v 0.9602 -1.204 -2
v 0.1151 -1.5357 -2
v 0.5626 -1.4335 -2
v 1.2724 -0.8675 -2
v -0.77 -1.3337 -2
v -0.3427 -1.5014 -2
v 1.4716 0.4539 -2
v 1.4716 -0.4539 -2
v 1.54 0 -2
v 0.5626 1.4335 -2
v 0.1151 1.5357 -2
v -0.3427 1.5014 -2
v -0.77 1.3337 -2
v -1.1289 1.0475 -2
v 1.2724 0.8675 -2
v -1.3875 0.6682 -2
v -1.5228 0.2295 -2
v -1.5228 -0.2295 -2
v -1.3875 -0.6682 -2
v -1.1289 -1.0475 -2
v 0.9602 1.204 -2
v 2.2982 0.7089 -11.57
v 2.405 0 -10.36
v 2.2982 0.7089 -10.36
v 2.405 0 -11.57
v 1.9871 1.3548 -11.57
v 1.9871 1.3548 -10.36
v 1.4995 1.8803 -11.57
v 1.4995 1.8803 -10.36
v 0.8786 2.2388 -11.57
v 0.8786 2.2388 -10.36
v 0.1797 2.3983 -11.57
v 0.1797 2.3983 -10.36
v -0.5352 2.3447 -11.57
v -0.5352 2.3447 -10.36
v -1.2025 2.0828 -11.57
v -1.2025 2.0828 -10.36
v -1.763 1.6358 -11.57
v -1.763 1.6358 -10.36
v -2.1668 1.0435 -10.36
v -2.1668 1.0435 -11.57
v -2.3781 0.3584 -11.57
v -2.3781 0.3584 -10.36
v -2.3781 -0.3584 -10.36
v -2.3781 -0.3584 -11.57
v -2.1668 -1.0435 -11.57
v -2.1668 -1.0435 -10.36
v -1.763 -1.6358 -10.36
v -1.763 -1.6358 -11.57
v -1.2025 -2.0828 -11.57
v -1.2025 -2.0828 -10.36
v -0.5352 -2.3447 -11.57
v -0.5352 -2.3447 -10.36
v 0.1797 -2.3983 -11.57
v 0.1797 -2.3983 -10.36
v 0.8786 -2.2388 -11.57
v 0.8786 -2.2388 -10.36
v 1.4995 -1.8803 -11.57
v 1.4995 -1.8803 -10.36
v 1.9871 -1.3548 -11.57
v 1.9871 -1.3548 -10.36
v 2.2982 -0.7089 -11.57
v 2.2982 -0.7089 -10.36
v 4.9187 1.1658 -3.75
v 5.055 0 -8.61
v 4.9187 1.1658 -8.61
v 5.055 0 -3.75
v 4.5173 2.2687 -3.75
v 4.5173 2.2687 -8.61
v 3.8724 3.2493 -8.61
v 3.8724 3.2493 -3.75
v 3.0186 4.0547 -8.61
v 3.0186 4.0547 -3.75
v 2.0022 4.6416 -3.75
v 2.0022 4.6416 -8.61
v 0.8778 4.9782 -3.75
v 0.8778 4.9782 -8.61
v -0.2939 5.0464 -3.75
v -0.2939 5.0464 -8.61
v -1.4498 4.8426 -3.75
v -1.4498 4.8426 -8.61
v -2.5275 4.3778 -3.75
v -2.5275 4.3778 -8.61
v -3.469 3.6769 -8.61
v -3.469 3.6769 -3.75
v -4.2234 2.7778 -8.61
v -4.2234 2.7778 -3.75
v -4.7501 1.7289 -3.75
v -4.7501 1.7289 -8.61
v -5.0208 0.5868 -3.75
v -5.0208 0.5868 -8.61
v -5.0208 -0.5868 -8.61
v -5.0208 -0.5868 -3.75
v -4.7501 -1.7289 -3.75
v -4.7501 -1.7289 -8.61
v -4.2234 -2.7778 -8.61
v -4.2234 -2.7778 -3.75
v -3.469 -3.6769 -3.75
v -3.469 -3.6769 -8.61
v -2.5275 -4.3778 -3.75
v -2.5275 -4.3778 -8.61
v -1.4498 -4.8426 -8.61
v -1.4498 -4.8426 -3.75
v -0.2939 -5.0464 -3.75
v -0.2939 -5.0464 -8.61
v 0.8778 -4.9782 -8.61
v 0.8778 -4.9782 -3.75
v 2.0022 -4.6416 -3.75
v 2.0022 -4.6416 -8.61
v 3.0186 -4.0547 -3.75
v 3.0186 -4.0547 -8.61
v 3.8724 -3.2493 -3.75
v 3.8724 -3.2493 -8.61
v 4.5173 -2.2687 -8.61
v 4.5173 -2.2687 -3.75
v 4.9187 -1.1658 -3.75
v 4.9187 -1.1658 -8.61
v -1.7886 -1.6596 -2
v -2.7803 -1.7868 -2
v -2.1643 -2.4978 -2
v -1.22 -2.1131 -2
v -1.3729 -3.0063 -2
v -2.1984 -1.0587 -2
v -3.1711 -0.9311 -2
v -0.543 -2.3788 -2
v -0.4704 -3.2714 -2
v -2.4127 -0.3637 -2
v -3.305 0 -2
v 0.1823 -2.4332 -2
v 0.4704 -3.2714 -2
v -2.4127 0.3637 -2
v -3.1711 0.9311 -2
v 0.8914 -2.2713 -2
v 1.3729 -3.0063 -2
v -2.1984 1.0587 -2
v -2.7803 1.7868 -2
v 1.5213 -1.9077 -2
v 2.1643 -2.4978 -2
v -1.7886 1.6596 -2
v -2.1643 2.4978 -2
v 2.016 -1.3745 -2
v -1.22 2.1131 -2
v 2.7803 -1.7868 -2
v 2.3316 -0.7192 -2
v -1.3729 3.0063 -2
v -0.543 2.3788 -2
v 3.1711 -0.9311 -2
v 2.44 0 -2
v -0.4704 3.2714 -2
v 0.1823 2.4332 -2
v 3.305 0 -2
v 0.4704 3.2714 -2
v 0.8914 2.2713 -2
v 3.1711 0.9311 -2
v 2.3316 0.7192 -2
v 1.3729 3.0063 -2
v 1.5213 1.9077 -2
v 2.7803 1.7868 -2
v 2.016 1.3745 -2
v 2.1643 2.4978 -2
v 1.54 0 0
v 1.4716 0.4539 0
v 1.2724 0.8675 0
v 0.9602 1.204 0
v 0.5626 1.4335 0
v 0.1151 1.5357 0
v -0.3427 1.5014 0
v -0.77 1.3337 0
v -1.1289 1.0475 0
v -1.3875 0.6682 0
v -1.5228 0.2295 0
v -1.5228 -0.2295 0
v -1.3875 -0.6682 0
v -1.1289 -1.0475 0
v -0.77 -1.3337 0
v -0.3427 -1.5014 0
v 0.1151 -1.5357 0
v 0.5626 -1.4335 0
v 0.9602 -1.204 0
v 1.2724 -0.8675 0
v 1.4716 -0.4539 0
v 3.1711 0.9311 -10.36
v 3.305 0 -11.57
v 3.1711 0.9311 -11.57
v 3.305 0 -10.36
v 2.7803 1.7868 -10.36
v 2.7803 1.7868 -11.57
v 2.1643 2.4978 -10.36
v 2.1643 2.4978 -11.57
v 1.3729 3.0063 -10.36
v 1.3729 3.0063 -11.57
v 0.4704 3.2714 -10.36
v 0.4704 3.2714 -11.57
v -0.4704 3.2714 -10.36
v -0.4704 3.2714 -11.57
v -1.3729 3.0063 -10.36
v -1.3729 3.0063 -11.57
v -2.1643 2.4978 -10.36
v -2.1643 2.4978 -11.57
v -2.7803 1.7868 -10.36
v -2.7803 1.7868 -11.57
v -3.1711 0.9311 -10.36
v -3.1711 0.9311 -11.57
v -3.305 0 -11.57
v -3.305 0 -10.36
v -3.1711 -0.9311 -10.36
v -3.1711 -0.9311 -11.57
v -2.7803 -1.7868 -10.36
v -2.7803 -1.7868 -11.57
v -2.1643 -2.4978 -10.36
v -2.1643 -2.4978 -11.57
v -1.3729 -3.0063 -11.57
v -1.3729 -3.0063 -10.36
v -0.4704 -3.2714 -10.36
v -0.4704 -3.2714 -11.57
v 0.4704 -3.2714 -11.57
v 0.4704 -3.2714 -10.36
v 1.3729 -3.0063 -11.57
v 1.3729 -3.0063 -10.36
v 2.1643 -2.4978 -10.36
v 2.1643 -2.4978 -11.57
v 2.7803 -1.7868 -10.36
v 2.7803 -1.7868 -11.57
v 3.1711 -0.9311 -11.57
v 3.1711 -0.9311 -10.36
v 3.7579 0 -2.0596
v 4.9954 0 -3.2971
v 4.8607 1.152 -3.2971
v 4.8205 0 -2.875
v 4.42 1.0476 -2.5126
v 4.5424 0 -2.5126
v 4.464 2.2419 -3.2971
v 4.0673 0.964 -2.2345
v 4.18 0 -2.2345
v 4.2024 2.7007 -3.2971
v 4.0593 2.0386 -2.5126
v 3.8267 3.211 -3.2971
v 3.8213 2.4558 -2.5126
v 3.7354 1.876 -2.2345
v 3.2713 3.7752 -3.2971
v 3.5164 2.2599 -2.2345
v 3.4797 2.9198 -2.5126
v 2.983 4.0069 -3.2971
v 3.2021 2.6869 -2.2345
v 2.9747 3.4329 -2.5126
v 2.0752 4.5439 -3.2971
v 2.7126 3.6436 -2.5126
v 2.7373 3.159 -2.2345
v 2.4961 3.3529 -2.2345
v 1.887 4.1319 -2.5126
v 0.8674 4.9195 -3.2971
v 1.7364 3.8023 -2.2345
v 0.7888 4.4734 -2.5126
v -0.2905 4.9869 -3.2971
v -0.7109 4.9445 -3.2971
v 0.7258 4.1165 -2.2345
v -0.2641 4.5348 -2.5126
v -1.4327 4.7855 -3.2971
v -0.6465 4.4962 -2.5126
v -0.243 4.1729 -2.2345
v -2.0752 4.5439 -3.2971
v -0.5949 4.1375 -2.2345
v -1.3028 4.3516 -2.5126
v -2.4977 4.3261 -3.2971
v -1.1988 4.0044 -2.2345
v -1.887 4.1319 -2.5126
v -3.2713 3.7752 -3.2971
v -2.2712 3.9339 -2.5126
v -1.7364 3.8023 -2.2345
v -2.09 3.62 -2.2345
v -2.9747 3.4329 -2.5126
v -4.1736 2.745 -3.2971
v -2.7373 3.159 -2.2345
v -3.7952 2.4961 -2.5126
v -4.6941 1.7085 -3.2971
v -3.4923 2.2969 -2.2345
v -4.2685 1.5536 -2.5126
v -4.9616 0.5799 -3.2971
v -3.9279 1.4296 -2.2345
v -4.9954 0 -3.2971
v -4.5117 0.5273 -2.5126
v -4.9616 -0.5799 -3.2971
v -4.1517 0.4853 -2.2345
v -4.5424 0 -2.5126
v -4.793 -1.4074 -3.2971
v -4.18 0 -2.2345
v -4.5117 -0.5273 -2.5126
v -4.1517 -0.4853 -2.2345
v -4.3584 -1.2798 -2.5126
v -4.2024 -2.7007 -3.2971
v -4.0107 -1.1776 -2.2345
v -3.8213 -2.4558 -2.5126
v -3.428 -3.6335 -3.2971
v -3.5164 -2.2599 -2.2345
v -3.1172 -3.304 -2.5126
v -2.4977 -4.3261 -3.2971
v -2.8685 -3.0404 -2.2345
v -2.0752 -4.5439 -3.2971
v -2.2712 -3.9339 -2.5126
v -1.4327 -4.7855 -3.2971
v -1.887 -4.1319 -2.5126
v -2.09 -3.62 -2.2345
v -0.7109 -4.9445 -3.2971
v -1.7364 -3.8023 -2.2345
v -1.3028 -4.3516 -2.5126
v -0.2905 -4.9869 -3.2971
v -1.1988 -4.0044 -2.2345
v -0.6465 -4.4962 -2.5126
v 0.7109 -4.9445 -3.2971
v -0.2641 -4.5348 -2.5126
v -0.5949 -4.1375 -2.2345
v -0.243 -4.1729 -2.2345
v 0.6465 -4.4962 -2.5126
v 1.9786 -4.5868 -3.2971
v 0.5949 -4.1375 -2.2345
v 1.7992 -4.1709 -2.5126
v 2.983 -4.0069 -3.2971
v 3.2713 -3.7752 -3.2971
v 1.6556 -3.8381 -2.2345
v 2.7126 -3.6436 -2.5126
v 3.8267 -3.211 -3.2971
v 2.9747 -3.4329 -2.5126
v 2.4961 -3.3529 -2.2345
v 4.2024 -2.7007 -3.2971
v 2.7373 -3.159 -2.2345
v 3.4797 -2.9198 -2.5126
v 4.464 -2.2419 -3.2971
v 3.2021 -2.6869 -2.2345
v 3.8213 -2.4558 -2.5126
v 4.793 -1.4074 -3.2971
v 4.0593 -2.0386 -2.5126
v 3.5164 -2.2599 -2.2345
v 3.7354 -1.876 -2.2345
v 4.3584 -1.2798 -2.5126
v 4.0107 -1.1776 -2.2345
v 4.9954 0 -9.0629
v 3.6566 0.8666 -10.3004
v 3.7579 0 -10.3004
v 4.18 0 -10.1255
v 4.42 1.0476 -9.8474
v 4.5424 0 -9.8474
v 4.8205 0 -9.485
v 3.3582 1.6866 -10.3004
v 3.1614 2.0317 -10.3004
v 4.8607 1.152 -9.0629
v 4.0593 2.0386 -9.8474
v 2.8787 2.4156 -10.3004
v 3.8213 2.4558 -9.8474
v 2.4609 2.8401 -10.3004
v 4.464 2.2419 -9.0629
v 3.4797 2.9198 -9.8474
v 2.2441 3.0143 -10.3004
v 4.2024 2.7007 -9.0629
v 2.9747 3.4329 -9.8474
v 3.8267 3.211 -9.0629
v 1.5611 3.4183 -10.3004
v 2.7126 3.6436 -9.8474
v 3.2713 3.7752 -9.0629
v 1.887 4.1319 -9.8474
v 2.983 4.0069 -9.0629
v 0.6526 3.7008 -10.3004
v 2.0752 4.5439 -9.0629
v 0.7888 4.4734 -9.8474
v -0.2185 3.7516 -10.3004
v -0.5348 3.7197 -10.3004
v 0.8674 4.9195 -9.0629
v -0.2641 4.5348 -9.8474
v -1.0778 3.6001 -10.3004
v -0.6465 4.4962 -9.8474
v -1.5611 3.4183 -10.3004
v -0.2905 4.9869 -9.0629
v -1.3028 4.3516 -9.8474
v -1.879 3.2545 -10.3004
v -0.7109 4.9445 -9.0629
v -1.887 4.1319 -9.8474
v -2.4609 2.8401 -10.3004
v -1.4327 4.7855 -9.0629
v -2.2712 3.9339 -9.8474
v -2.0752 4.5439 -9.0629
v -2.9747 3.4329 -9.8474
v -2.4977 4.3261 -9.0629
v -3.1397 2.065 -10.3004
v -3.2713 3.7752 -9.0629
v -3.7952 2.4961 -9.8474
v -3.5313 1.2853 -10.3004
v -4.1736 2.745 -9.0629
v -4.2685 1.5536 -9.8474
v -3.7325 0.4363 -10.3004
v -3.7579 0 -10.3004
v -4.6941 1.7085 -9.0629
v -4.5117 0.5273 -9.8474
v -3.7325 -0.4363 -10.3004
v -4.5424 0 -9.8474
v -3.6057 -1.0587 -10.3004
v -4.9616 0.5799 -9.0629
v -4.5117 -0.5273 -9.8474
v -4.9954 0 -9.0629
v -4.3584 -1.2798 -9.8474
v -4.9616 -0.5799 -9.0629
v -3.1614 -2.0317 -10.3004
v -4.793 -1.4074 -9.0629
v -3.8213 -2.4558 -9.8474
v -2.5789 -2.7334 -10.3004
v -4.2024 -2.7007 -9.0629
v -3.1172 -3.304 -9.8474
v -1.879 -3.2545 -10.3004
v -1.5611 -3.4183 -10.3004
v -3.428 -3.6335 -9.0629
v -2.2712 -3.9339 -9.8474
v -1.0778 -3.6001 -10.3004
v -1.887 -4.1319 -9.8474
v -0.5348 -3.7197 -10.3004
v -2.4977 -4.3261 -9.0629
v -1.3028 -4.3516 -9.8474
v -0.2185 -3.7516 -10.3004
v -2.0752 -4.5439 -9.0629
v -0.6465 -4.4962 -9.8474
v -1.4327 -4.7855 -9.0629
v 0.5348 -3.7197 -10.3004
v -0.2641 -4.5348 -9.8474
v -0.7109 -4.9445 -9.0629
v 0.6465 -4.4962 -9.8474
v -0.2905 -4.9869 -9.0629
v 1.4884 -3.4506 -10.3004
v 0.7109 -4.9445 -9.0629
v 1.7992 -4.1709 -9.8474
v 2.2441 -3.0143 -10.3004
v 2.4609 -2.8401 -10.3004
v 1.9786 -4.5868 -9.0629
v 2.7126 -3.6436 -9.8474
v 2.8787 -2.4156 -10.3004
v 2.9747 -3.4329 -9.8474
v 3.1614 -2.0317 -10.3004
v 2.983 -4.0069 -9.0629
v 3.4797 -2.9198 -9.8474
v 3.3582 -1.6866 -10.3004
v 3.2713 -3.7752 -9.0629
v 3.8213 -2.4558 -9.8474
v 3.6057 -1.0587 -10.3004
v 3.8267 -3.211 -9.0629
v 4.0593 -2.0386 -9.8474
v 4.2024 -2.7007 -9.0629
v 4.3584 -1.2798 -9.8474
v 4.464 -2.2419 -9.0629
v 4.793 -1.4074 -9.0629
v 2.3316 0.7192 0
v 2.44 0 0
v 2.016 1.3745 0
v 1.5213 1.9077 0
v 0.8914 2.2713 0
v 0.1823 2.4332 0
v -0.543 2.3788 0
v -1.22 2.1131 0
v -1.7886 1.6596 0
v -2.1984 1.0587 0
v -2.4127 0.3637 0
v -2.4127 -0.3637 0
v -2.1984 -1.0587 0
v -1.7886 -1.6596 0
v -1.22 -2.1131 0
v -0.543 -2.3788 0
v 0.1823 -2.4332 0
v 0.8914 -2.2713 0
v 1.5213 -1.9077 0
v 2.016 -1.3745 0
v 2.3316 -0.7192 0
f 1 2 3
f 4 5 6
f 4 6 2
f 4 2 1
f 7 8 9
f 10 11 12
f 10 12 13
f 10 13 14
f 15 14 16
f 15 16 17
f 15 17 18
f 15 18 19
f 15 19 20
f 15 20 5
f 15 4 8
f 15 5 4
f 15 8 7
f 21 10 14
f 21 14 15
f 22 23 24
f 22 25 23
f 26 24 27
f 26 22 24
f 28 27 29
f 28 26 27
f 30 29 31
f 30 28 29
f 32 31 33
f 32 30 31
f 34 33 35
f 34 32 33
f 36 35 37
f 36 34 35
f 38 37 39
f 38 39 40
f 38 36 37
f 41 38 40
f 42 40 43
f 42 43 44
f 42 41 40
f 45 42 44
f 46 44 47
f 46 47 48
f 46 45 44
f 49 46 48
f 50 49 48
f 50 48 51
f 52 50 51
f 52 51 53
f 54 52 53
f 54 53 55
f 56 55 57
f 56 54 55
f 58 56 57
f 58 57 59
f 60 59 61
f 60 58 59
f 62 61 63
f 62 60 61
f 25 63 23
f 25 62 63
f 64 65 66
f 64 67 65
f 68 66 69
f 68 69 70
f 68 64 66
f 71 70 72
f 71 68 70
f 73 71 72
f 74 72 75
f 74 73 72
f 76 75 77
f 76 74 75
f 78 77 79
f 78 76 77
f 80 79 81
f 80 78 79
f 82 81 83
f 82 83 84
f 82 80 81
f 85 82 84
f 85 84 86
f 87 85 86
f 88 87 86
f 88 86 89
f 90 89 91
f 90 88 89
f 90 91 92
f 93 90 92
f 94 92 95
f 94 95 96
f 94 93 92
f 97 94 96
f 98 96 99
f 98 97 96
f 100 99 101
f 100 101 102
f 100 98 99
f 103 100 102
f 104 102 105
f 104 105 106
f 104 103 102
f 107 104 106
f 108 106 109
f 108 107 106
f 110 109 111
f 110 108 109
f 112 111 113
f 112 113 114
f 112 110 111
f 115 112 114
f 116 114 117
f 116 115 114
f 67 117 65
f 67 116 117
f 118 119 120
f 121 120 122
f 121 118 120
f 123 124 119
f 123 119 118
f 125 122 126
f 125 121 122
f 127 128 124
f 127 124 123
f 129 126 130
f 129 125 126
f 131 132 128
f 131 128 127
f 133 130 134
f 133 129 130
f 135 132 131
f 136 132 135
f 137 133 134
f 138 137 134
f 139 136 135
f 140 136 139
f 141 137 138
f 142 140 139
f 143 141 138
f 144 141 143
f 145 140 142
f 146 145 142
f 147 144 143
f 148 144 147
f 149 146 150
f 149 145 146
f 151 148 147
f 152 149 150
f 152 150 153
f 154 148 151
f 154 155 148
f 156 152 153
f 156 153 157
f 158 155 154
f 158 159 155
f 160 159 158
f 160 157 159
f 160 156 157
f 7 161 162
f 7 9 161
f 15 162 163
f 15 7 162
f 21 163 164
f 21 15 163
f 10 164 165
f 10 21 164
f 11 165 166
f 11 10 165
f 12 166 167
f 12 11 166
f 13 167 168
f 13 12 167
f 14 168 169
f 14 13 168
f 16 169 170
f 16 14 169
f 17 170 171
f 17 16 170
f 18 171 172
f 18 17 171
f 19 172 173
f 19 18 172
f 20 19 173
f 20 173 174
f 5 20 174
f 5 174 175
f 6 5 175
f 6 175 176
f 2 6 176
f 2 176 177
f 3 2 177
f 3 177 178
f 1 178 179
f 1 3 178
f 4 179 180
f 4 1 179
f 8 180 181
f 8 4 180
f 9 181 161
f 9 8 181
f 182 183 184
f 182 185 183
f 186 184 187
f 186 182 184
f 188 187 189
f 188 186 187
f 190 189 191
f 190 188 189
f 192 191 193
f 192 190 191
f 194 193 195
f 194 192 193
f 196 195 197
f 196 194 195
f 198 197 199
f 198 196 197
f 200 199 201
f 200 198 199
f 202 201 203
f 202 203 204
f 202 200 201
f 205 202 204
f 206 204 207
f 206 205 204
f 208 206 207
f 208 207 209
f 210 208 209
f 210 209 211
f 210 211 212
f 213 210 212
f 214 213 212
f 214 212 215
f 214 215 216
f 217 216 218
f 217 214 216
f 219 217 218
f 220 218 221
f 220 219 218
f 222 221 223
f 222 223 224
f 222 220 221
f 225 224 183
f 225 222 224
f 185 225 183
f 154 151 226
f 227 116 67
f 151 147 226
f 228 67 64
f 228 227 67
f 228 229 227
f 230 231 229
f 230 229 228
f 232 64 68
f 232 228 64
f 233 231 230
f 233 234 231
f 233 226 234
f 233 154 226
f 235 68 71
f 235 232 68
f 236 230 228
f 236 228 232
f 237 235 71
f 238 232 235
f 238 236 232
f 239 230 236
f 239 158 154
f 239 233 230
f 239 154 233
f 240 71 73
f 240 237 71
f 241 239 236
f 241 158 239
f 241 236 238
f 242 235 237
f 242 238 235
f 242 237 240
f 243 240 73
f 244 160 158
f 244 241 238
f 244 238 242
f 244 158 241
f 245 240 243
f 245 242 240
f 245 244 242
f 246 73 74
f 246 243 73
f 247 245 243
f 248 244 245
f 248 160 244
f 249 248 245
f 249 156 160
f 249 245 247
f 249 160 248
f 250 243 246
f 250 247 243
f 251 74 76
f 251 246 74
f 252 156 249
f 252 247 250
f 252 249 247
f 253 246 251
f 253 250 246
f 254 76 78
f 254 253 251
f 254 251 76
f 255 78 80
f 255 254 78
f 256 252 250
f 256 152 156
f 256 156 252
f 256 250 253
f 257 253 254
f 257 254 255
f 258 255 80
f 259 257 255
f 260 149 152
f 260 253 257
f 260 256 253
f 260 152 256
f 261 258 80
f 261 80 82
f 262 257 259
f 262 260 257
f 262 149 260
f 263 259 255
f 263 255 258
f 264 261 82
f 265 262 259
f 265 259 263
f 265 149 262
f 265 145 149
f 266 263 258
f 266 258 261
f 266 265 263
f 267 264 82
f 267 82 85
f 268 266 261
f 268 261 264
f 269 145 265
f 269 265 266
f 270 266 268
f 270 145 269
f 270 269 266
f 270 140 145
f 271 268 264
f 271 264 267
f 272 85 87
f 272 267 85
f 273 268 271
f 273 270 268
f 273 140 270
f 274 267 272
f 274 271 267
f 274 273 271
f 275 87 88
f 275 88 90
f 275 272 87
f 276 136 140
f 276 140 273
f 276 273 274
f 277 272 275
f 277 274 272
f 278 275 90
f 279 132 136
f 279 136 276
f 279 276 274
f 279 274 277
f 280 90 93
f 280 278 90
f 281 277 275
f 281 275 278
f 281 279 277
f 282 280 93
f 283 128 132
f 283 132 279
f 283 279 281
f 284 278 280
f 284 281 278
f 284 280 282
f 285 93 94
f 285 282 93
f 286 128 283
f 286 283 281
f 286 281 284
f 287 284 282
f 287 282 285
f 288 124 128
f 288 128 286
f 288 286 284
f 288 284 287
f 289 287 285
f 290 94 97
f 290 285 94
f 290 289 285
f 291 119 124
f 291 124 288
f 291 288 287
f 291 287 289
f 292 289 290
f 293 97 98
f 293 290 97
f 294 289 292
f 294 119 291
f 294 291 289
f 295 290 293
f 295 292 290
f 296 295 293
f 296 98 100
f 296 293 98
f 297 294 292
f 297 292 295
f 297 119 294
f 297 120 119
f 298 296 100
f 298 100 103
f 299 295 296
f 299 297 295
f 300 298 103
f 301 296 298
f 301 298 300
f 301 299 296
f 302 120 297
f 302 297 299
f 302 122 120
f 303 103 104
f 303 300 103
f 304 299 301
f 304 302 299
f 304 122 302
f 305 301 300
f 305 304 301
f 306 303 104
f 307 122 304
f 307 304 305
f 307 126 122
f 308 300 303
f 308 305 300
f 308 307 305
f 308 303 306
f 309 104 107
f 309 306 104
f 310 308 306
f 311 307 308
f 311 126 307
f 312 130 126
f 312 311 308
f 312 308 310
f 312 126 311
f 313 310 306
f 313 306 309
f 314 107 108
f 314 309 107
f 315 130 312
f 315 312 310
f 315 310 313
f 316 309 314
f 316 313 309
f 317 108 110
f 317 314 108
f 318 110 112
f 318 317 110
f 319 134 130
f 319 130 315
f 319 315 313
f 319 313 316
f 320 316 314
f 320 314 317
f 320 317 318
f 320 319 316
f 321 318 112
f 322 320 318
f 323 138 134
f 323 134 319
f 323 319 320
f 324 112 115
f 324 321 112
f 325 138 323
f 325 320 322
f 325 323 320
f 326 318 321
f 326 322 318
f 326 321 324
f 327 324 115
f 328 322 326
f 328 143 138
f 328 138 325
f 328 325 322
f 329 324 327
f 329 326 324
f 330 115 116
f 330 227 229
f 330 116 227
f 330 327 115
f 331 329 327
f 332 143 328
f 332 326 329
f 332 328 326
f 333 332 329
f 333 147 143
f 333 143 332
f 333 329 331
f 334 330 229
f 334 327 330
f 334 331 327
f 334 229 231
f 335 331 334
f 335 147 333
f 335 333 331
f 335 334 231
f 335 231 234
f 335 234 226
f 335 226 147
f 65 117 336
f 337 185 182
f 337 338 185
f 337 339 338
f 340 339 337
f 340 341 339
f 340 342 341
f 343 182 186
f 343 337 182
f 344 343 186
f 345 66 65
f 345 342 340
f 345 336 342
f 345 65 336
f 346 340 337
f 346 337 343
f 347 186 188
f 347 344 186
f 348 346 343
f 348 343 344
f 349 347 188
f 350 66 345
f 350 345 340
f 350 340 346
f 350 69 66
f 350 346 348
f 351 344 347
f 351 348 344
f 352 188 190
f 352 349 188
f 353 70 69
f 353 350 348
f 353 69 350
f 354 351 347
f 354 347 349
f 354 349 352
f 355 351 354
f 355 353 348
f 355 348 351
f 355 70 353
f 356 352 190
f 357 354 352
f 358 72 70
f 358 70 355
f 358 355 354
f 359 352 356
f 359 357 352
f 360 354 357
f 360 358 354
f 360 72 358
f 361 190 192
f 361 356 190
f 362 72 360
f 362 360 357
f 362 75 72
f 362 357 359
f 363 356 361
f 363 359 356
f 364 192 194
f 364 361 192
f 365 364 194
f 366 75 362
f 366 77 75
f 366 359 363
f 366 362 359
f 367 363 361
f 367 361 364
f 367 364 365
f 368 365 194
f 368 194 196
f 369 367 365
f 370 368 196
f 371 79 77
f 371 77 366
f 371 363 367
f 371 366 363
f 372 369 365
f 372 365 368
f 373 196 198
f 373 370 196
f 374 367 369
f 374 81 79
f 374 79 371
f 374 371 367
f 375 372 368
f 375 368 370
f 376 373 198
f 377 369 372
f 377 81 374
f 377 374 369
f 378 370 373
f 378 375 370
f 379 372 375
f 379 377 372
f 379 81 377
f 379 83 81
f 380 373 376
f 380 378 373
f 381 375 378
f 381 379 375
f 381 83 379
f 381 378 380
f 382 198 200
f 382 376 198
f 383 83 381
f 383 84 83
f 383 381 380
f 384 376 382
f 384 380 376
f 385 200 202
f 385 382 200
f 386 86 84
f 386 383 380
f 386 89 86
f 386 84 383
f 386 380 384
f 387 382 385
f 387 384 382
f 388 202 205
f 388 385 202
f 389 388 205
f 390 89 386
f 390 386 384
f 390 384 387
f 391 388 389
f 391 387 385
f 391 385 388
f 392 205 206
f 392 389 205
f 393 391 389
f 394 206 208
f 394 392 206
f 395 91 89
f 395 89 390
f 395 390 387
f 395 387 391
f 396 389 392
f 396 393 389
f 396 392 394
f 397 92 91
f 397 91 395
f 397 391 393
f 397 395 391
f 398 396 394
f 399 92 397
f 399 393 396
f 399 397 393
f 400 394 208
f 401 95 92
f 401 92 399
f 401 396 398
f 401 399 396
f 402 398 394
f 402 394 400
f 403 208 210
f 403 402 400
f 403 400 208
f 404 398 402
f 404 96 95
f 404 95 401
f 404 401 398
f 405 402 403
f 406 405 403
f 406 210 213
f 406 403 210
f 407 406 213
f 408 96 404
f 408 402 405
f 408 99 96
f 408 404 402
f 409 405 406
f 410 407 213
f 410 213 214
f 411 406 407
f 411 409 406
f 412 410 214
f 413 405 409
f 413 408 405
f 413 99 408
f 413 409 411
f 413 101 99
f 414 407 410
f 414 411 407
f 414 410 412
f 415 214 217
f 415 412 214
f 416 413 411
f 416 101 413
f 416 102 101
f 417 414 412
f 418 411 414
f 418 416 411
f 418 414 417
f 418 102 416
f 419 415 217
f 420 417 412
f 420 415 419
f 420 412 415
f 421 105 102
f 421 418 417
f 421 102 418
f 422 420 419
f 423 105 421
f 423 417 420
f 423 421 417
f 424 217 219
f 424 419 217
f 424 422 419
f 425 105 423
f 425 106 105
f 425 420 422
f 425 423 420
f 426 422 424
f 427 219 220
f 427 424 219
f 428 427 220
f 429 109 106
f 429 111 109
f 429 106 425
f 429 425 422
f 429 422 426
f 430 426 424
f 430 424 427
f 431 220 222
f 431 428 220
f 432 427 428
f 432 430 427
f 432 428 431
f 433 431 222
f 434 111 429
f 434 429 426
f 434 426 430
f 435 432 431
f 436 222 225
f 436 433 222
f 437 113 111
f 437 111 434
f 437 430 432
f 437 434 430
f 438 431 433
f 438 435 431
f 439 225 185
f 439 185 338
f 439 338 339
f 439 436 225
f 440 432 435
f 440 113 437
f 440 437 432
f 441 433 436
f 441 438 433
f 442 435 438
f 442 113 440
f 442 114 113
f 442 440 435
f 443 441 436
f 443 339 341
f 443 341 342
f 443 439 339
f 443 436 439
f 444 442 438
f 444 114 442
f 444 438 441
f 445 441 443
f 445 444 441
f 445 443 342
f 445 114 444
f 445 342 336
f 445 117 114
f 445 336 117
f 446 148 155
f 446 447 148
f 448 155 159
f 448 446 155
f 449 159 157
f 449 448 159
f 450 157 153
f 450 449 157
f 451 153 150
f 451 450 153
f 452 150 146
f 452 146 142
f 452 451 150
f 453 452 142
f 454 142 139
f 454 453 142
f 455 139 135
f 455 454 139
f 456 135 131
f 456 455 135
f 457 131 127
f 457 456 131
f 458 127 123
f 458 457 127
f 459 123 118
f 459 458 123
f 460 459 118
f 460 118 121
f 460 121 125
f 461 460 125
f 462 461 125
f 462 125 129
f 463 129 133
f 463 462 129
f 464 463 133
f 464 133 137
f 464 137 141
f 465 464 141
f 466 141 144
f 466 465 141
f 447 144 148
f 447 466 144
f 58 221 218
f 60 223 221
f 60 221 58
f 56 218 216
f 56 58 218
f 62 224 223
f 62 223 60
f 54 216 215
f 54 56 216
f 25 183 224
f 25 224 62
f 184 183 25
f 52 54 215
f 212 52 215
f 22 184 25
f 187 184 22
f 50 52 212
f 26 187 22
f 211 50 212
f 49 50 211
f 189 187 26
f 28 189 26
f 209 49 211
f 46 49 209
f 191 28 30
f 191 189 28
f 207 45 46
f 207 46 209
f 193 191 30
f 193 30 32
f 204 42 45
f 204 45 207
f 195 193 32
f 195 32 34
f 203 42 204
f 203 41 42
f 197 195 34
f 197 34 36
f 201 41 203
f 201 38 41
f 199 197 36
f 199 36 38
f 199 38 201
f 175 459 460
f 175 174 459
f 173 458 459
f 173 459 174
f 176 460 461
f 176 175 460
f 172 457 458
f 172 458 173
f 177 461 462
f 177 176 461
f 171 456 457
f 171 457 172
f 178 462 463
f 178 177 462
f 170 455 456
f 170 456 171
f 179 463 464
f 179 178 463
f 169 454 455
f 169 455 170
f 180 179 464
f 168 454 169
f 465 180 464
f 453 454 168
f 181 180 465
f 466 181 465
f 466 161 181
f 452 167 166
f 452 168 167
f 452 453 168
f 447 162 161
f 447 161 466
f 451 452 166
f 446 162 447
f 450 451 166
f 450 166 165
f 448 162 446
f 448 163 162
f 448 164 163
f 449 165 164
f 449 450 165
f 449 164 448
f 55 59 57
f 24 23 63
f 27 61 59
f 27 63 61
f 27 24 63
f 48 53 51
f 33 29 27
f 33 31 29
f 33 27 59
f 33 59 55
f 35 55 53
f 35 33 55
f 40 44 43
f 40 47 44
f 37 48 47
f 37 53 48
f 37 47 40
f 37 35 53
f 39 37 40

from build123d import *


with BuildPart() as f1:
    # F0 (on Front) → F1 (revolve)
    with BuildSketch(Plane.XZ):
        with BuildLine():
            Line((2.44, 0), (1.54, 0))
            Line((1.54, 0), (1.54, -2))
            Line((1.54, -2), (0, -2))
            Line((0, -2), (0, -10.36))
            Line((0, -10.36), (2.405, -10.36))
            Line((2.405, -10.36), (2.405, -11.57))
            Line((2.405, -11.57), (3.305, -11.57))
            Line((3.305, -11.57), (3.305, -10.36))
            ThreePointArc((3.305, -10.36), (4.542437, -9.847437), (5.055, -8.61))
            Line((5.055, -8.61), (5.055, -3.75))
            ThreePointArc((5.055, -3.75), (4.542437, -2.512563), (3.305, -2))
            Line((3.305, -2), (2.44, -2))
            Line((2.44, -2), (2.44, 0))
        make_face()
    revolve(axis=Axis((0, 0, 28.045654), (0, 0, 1)))


solid = f1.part
